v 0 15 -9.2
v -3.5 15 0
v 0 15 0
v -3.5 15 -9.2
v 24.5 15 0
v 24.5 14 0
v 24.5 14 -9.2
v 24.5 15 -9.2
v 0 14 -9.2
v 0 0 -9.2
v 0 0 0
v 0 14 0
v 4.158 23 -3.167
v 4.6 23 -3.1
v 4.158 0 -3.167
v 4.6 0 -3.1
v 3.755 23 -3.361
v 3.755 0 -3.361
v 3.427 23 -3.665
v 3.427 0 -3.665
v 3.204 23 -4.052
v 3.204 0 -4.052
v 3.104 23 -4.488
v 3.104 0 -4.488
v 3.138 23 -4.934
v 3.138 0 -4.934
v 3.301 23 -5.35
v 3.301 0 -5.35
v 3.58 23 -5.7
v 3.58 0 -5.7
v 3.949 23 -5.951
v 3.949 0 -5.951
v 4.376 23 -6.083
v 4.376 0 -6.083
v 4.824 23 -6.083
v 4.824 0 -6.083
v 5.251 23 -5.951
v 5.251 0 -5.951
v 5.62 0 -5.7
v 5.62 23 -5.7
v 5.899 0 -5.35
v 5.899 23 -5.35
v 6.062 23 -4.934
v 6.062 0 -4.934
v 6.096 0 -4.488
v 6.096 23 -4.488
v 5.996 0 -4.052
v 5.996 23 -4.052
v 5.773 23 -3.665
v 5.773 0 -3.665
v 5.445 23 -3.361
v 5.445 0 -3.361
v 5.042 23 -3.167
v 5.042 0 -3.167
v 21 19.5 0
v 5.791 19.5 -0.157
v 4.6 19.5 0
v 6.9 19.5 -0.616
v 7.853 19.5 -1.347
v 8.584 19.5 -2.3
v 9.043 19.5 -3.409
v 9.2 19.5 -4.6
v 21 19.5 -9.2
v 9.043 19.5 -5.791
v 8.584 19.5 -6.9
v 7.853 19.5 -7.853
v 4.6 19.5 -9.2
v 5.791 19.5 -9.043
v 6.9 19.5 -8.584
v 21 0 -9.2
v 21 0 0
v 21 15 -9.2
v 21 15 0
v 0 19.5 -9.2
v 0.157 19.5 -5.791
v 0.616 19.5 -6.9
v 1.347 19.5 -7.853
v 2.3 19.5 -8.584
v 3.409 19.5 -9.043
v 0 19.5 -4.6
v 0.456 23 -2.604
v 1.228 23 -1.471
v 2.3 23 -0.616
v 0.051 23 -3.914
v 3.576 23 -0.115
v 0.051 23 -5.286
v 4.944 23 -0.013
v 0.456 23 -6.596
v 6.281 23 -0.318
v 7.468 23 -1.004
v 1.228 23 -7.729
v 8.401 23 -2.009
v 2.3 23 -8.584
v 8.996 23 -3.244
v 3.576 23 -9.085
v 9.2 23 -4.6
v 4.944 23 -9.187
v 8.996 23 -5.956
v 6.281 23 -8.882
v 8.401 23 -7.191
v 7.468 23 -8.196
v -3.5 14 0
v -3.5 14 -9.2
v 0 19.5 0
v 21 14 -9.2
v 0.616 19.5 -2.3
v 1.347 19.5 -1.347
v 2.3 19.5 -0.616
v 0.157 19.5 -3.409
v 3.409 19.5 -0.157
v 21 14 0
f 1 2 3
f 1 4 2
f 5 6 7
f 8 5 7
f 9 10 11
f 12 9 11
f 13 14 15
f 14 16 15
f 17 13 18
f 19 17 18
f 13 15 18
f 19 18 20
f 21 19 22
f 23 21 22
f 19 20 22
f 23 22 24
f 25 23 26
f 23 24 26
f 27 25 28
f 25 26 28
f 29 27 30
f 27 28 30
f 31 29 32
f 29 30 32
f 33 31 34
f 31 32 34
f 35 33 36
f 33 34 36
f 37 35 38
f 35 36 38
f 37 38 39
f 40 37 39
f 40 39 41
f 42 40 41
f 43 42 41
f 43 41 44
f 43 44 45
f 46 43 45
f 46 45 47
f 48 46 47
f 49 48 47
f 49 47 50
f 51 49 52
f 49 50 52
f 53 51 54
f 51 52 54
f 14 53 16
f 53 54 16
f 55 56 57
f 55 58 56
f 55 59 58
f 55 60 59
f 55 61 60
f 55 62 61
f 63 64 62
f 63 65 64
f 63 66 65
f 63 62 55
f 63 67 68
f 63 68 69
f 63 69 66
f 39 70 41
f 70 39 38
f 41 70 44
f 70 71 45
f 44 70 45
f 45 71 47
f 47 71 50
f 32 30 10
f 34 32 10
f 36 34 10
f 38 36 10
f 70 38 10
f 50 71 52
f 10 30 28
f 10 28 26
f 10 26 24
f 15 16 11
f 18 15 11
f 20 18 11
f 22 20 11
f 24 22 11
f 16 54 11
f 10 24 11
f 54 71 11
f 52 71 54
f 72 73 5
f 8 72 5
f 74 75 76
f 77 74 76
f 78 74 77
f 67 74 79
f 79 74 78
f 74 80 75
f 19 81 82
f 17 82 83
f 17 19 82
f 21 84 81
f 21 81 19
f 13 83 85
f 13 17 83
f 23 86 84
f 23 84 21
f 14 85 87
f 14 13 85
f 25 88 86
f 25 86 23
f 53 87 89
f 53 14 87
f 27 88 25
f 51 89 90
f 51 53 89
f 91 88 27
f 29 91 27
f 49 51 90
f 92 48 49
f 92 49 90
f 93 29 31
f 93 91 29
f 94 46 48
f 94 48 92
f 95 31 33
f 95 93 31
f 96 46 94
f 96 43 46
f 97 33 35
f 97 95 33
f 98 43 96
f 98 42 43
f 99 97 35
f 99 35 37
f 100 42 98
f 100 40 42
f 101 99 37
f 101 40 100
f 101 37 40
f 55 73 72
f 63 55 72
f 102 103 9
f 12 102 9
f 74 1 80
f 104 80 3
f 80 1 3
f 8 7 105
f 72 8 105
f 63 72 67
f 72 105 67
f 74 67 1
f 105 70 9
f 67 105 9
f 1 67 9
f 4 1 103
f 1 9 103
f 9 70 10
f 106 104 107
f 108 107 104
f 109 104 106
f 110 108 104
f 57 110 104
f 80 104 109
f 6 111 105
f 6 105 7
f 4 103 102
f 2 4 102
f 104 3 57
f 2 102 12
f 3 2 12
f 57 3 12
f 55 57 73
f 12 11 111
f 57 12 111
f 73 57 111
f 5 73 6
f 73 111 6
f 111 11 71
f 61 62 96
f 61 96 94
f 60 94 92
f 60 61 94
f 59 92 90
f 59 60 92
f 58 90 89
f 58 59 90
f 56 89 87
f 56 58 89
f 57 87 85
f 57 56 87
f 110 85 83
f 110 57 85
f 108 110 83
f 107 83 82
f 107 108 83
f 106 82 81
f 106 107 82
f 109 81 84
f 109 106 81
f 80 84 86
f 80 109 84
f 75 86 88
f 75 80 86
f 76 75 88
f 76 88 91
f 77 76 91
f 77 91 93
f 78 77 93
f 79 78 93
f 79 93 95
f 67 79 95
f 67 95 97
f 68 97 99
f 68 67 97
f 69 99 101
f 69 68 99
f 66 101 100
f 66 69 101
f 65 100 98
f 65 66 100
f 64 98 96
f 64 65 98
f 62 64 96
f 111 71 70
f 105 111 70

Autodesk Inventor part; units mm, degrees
ref_plane "YZ Plane" through (0, 0, 0) normal (1, 0, 0) x (0, 1, 0)
ref_plane "XZ Plane" through (0, 0, 0) normal (0, 1, 0) x (-1, 0, 0)
ref_plane "XY Plane" through (0, 0, 0) normal (0, 0, 1) x (1, 0, 0)
sketch "スケッチ1" plane through (0, 0, 0) normal (0, 1, 0) x (-1, 0, 0)
  line L0 (0, 0) -> (-21, 0)
  line L1 (-21, 0) -> (-21, -9.2)
  line L2 (-21, -9.2) -> (0, -9.2)
  line L3 (0, -9.2) -> (0, 0)
  dimension "d0" = 21
  dimension "d1" = 9.2
extrude "押し出し1" add sketch "スケッチ1" along normal blind 14
sketch "スケッチ2" plane through (0, 14, 0) normal (0, 1, 0) x (1, 0, 0)
  line L0 (21, 0) -> (21, 9.2) projected
  line L1 (21, 9.2) -> (0, 9.2) projected
  line L2 (0, 9.2) -> (0, 0) projected
  line L3 (0, 0) -> (21, 0) projected
  line L4 (-3.5, 0) -> (24.5, 0)
  line L5 (24.5, 0) -> (24.5, 9.2)
  line L6 (24.5, 9.2) -> (-3.5, 9.2)
  line L7 (-3.5, 9.2) -> (-3.5, 0)
  dimension "d4" = 3.5
  dimension "d5" = 3.5
extrude "押し出し2" add sketch "スケッチ2" along normal blind 1
sketch "スケッチ3" plane through (0, 15, 0) normal (0, 1, 0) x (1, 0, 0)
  line L0 (-3.5, 0) -> (24.5, 0) projected
  line L1 (24.5, 9.2) -> (-3.5, 9.2) projected
  line L2 (0, 9.2) -> (0, 0) projected
  line L3 (21, 0) -> (21, 9.2) projected
extrude "押し出し3" add sketch "スケッチ3" along normal blind 4.5
sketch "スケッチ4" plane through (0, 19.5, 0) normal (0, 1, 0) x (1, 0, 0)
  line L0 (21, 9.2) -> (0, 9.2) projected
  line L1 (0, 9.2) -> (0, 0) projected
  line L2 (0, 0) -> (21, 0) projected
  circle A0 centre (4.6, 4.6) radius 4.6
extrude "押し出し4" add sketch "スケッチ4" along normal blind 3.5 contours A0
sketch "スケッチ5" plane through (4.6, 23, -4.6) normal (0, 1, 0) x (1, 0, 0)
  circle A0 centre (0, 0) radius 4.6 projected
  point P0 (-4.6, -4.6)
hole "穴1" at (4.6, 23, -4.6) direction (0, -1, 0) diameter 3 end through all
equation "\"d5\" = d4"
properties part number "motor"
